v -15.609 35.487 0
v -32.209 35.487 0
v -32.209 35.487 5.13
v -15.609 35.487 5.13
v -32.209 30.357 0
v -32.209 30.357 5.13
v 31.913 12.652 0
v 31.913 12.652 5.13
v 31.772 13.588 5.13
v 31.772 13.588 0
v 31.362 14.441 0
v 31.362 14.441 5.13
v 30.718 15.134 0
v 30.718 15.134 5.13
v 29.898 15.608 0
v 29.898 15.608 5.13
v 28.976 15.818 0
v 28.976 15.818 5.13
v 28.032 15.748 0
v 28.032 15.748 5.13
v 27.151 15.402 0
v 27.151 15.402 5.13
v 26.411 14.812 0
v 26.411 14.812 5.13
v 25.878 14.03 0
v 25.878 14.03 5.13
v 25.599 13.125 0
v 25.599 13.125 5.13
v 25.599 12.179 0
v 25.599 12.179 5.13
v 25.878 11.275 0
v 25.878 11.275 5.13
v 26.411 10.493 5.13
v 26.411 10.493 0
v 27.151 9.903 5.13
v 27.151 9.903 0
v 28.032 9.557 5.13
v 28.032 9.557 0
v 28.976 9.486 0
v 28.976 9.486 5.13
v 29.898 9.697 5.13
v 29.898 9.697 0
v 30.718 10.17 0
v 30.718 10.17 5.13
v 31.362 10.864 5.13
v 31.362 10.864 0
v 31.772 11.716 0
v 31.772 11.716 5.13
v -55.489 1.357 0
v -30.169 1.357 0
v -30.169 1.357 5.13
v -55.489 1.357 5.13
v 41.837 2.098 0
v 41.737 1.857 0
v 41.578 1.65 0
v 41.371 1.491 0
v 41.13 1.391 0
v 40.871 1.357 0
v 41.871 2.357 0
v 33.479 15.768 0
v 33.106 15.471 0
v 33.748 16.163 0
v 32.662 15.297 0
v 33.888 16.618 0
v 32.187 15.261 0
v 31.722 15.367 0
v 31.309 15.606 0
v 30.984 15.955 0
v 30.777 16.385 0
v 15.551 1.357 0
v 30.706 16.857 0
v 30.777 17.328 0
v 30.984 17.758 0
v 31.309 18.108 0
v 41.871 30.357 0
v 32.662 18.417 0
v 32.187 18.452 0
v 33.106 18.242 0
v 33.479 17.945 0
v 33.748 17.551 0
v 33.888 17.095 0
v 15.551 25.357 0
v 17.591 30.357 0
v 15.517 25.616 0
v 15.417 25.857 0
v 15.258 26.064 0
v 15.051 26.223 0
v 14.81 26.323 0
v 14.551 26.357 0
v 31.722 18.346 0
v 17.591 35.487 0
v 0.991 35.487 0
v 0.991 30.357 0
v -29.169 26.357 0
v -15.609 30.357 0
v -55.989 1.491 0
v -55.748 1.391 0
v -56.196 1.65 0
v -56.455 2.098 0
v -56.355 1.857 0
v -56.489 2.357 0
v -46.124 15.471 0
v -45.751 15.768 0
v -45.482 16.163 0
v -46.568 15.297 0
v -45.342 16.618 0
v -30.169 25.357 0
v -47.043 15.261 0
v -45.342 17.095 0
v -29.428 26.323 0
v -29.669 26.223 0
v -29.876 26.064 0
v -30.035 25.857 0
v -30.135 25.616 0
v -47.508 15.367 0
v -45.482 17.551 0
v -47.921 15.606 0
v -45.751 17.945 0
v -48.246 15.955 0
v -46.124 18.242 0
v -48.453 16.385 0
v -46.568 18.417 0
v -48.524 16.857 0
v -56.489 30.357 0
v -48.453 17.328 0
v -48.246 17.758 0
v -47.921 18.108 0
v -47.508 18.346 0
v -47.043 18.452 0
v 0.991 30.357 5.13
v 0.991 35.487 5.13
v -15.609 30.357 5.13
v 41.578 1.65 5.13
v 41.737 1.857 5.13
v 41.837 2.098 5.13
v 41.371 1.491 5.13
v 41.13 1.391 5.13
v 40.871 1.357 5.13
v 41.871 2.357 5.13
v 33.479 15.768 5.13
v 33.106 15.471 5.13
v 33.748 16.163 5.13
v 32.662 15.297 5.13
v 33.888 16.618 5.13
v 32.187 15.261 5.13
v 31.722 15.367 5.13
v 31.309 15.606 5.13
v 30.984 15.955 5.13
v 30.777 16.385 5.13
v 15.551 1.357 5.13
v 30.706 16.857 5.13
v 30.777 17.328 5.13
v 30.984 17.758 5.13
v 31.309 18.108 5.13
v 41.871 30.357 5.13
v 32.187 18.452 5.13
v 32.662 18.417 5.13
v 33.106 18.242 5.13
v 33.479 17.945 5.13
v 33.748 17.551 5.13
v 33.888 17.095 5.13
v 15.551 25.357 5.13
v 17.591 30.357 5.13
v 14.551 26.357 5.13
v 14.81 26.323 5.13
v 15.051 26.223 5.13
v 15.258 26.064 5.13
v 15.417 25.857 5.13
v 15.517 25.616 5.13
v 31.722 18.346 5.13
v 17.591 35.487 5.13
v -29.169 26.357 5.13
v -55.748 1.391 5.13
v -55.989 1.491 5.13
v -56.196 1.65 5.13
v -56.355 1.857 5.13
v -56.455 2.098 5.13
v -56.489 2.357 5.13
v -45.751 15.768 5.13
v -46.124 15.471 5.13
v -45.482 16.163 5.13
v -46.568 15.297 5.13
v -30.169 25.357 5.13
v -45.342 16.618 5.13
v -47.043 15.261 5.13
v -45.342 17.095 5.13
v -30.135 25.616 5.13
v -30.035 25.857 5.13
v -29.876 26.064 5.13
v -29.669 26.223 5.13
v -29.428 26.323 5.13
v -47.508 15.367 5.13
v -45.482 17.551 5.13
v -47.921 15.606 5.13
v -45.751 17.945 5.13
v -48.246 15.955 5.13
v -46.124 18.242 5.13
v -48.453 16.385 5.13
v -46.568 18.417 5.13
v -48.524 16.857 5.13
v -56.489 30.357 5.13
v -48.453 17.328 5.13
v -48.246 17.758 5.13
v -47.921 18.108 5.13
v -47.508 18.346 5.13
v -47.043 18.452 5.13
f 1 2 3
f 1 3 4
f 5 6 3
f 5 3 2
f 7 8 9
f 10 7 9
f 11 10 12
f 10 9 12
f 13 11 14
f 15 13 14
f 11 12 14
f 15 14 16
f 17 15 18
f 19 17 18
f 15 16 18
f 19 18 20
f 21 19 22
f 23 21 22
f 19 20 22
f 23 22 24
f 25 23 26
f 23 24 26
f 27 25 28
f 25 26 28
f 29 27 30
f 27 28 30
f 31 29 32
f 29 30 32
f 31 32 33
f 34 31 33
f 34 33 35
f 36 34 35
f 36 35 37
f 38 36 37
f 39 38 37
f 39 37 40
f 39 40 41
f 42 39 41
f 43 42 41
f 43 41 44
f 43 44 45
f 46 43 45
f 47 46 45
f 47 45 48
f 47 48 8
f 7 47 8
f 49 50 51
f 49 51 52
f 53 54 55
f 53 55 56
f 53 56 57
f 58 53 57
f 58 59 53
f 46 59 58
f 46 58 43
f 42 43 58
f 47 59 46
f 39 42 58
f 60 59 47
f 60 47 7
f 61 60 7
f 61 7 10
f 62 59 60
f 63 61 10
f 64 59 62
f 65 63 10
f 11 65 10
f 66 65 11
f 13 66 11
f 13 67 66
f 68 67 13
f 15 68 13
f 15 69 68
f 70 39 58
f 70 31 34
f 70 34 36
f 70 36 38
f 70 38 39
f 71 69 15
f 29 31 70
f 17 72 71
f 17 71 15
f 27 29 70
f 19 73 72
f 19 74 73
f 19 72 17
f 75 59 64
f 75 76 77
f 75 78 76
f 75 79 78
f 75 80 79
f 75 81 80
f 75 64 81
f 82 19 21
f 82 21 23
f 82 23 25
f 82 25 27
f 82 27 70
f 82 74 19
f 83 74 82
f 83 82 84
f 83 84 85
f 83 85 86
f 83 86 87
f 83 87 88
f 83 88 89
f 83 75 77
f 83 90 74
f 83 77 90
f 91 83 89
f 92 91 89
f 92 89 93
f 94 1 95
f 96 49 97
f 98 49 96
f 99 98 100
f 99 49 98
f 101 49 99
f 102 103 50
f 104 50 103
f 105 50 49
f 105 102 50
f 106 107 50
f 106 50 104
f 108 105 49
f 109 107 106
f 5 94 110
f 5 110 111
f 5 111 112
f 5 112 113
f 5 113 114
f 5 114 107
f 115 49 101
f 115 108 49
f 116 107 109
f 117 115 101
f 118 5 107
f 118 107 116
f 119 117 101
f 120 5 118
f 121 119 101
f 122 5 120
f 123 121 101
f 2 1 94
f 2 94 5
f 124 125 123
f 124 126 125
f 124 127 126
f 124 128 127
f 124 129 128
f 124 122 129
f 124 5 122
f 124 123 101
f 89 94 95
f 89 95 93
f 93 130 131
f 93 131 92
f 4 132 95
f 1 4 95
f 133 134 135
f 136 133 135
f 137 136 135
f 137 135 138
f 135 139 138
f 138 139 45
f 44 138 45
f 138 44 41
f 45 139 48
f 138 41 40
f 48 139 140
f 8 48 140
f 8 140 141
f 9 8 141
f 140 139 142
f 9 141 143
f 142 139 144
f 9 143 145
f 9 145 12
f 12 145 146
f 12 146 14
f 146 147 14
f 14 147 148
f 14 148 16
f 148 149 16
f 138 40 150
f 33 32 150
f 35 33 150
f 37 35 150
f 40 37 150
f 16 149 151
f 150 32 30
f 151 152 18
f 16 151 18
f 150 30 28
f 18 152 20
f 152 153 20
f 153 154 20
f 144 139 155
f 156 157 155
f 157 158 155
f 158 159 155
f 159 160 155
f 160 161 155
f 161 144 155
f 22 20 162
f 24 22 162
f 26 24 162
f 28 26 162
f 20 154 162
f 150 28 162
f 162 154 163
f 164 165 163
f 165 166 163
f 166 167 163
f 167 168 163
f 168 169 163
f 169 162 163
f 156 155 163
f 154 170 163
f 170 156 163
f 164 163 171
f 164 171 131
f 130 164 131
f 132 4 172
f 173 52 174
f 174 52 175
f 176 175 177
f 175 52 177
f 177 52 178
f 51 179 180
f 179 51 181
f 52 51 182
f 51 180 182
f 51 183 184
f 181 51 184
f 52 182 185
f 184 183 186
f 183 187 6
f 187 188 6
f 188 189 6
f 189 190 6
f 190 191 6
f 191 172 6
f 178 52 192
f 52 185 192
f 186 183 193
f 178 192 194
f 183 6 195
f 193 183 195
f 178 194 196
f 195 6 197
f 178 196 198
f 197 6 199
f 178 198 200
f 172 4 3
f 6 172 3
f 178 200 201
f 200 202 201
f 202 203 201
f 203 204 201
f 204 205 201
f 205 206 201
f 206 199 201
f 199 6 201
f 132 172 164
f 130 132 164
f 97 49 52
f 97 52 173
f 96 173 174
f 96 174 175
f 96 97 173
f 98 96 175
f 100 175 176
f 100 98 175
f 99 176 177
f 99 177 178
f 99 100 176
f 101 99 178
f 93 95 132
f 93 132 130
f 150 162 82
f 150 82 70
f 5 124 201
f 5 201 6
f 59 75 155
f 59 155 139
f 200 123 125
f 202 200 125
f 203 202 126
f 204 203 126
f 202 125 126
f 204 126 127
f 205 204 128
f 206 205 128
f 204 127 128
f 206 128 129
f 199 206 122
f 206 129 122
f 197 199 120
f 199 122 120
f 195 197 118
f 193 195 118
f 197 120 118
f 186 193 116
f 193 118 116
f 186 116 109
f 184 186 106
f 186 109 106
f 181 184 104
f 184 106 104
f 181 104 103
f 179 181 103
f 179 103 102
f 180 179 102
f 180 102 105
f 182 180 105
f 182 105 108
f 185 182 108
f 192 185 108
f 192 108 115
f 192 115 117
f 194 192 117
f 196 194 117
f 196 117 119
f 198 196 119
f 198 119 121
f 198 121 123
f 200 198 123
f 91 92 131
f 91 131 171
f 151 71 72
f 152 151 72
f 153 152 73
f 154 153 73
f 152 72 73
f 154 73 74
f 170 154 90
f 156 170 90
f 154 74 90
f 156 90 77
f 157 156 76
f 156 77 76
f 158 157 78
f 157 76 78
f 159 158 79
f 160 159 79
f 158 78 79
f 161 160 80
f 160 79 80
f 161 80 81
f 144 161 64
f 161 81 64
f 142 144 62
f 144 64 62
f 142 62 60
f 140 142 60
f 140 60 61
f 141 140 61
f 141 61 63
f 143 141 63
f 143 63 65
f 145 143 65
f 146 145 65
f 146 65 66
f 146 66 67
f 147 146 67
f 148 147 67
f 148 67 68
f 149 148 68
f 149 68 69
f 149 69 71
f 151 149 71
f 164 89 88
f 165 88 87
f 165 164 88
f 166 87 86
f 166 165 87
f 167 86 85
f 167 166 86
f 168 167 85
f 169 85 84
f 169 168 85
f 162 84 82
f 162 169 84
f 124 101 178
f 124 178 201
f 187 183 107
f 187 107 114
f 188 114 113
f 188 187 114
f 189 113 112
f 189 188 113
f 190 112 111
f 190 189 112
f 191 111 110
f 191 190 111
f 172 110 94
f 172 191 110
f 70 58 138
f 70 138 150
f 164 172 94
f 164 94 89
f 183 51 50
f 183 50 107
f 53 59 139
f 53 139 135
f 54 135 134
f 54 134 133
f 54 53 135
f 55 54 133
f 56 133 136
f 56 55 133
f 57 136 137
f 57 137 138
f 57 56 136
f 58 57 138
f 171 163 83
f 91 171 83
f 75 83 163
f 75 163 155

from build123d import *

# Parameters (mm, degrees)
MAIN_DEPTH                  = 5.13
SKETCH2_W                   = 16.6
SKETCH2_H                   = 5.13
TEETH_DEPTH                 = 5.13
M3_CLEARANCE_HOLE1_D        = 3.2
M3_CLEARANCE_HOLE1_DEPTH    = 5.13
HINGE_SLOT_REACH            = 7.13
THERMISTOR_WIRES_HOLE_REACH = 7.13
SKETCH6_R                   = 3.175


with BuildPart() as part:
    # Sketch1 → Main (new body)
    with BuildSketch(Plane.XY):
        with BuildLine():
            Line((-56.488759744, 30.356747088), (41.871240256, 30.356747088))
            Line((41.871240256, 30.356747088), (41.871240256, 2.356747088))
            ThreePointArc((41.871240256, 2.356747088), (41.578347037, 1.649640307), (40.871240256, 1.356747088))
            Line((40.871240256, 1.356747088), (-55.488759744, 1.356747088))
            ThreePointArc((-55.488759744, 1.356747088), (-56.195866525, 1.649640307), (-56.488759744, 2.356747088))
            Line((-56.488759744, 2.356747088), (-56.488759744, 30.356747088))
        make_face()
    extrude(amount=MAIN_DEPTH)

    # Sketch2 → Teeth (add)
    with BuildSketch(Plane(origin=(0, 30.356747088, 0), x_dir=(1, 0, 0), z_dir=(0, 1, 0))):
        with Locations((9.291240256, -2.565)):
            Rectangle(SKETCH2_W, SKETCH2_H)
        with Locations((-23.908759744, -2.565)):
            Rectangle(SKETCH2_W, SKETCH2_H)
    extrude(amount=TEETH_DEPTH)

    # M3 Clearance Hole1
    with Locations(Plane.XY.offset(5.13)):
        with Locations((-46.923759744, 16.856747088), (32.306240256, 16.856747088)):
            Hole(M3_CLEARANCE_HOLE1_D / 2, depth=M3_CLEARANCE_HOLE1_DEPTH)

    # Sketch5 → Hinge slot (cut, up to next)
    with BuildSketch(Plane.XY.offset(5.13), mode=Mode.PRIVATE) as hinge_slot_sk1:
        with BuildLine():
            Line((-29.168759744, 26.356747088), (14.551240256, 26.356747088))
            ThreePointArc((14.551240256, 26.356747088), (15.258347037, 26.06385387), (15.551240256, 25.356747088))
            Line((15.551240256, 25.356747088), (15.551240256, 1.356747088))
            Line((15.551240256, 1.356747088), (-30.168759744, 1.356747088))
            Line((-30.168759744, 1.356747088), (-30.168759744, 25.356747088))
            ThreePointArc((-30.168759744, 25.356747088), (-29.875866525, 26.06385387), (-29.168759744, 26.356747088))
        make_face()
    hinge_slot_tool1 = extrude(hinge_slot_sk1.sketch, amount=-HINGE_SLOT_REACH, mode=Mode.PRIVATE) & part.part
    add(hinge_slot_tool1.solids().sort_by_distance((-7.30876, 13.852135, 5.13))[0], mode=Mode.SUBTRACT)

    # Sketch6 → Thermistor wires hole (cut, up to next)
    with BuildSketch(Plane.XY.offset(5.13), mode=Mode.PRIVATE) as thermistor_wires_hole_sk1:
        with Locations((28.738240256, 12.652139603)):
            Circle(SKETCH6_R)
    thermistor_wires_hole_tool1 = extrude(thermistor_wires_hole_sk1.sketch, amount=-THERMISTOR_WIRES_HOLE_REACH, mode=Mode.PRIVATE) & part.part
    add(thermistor_wires_hole_tool1.solids().sort_by_distance((28.73824, 12.65214, 5.13))[0], mode=Mode.SUBTRACT)


solid = part.part
